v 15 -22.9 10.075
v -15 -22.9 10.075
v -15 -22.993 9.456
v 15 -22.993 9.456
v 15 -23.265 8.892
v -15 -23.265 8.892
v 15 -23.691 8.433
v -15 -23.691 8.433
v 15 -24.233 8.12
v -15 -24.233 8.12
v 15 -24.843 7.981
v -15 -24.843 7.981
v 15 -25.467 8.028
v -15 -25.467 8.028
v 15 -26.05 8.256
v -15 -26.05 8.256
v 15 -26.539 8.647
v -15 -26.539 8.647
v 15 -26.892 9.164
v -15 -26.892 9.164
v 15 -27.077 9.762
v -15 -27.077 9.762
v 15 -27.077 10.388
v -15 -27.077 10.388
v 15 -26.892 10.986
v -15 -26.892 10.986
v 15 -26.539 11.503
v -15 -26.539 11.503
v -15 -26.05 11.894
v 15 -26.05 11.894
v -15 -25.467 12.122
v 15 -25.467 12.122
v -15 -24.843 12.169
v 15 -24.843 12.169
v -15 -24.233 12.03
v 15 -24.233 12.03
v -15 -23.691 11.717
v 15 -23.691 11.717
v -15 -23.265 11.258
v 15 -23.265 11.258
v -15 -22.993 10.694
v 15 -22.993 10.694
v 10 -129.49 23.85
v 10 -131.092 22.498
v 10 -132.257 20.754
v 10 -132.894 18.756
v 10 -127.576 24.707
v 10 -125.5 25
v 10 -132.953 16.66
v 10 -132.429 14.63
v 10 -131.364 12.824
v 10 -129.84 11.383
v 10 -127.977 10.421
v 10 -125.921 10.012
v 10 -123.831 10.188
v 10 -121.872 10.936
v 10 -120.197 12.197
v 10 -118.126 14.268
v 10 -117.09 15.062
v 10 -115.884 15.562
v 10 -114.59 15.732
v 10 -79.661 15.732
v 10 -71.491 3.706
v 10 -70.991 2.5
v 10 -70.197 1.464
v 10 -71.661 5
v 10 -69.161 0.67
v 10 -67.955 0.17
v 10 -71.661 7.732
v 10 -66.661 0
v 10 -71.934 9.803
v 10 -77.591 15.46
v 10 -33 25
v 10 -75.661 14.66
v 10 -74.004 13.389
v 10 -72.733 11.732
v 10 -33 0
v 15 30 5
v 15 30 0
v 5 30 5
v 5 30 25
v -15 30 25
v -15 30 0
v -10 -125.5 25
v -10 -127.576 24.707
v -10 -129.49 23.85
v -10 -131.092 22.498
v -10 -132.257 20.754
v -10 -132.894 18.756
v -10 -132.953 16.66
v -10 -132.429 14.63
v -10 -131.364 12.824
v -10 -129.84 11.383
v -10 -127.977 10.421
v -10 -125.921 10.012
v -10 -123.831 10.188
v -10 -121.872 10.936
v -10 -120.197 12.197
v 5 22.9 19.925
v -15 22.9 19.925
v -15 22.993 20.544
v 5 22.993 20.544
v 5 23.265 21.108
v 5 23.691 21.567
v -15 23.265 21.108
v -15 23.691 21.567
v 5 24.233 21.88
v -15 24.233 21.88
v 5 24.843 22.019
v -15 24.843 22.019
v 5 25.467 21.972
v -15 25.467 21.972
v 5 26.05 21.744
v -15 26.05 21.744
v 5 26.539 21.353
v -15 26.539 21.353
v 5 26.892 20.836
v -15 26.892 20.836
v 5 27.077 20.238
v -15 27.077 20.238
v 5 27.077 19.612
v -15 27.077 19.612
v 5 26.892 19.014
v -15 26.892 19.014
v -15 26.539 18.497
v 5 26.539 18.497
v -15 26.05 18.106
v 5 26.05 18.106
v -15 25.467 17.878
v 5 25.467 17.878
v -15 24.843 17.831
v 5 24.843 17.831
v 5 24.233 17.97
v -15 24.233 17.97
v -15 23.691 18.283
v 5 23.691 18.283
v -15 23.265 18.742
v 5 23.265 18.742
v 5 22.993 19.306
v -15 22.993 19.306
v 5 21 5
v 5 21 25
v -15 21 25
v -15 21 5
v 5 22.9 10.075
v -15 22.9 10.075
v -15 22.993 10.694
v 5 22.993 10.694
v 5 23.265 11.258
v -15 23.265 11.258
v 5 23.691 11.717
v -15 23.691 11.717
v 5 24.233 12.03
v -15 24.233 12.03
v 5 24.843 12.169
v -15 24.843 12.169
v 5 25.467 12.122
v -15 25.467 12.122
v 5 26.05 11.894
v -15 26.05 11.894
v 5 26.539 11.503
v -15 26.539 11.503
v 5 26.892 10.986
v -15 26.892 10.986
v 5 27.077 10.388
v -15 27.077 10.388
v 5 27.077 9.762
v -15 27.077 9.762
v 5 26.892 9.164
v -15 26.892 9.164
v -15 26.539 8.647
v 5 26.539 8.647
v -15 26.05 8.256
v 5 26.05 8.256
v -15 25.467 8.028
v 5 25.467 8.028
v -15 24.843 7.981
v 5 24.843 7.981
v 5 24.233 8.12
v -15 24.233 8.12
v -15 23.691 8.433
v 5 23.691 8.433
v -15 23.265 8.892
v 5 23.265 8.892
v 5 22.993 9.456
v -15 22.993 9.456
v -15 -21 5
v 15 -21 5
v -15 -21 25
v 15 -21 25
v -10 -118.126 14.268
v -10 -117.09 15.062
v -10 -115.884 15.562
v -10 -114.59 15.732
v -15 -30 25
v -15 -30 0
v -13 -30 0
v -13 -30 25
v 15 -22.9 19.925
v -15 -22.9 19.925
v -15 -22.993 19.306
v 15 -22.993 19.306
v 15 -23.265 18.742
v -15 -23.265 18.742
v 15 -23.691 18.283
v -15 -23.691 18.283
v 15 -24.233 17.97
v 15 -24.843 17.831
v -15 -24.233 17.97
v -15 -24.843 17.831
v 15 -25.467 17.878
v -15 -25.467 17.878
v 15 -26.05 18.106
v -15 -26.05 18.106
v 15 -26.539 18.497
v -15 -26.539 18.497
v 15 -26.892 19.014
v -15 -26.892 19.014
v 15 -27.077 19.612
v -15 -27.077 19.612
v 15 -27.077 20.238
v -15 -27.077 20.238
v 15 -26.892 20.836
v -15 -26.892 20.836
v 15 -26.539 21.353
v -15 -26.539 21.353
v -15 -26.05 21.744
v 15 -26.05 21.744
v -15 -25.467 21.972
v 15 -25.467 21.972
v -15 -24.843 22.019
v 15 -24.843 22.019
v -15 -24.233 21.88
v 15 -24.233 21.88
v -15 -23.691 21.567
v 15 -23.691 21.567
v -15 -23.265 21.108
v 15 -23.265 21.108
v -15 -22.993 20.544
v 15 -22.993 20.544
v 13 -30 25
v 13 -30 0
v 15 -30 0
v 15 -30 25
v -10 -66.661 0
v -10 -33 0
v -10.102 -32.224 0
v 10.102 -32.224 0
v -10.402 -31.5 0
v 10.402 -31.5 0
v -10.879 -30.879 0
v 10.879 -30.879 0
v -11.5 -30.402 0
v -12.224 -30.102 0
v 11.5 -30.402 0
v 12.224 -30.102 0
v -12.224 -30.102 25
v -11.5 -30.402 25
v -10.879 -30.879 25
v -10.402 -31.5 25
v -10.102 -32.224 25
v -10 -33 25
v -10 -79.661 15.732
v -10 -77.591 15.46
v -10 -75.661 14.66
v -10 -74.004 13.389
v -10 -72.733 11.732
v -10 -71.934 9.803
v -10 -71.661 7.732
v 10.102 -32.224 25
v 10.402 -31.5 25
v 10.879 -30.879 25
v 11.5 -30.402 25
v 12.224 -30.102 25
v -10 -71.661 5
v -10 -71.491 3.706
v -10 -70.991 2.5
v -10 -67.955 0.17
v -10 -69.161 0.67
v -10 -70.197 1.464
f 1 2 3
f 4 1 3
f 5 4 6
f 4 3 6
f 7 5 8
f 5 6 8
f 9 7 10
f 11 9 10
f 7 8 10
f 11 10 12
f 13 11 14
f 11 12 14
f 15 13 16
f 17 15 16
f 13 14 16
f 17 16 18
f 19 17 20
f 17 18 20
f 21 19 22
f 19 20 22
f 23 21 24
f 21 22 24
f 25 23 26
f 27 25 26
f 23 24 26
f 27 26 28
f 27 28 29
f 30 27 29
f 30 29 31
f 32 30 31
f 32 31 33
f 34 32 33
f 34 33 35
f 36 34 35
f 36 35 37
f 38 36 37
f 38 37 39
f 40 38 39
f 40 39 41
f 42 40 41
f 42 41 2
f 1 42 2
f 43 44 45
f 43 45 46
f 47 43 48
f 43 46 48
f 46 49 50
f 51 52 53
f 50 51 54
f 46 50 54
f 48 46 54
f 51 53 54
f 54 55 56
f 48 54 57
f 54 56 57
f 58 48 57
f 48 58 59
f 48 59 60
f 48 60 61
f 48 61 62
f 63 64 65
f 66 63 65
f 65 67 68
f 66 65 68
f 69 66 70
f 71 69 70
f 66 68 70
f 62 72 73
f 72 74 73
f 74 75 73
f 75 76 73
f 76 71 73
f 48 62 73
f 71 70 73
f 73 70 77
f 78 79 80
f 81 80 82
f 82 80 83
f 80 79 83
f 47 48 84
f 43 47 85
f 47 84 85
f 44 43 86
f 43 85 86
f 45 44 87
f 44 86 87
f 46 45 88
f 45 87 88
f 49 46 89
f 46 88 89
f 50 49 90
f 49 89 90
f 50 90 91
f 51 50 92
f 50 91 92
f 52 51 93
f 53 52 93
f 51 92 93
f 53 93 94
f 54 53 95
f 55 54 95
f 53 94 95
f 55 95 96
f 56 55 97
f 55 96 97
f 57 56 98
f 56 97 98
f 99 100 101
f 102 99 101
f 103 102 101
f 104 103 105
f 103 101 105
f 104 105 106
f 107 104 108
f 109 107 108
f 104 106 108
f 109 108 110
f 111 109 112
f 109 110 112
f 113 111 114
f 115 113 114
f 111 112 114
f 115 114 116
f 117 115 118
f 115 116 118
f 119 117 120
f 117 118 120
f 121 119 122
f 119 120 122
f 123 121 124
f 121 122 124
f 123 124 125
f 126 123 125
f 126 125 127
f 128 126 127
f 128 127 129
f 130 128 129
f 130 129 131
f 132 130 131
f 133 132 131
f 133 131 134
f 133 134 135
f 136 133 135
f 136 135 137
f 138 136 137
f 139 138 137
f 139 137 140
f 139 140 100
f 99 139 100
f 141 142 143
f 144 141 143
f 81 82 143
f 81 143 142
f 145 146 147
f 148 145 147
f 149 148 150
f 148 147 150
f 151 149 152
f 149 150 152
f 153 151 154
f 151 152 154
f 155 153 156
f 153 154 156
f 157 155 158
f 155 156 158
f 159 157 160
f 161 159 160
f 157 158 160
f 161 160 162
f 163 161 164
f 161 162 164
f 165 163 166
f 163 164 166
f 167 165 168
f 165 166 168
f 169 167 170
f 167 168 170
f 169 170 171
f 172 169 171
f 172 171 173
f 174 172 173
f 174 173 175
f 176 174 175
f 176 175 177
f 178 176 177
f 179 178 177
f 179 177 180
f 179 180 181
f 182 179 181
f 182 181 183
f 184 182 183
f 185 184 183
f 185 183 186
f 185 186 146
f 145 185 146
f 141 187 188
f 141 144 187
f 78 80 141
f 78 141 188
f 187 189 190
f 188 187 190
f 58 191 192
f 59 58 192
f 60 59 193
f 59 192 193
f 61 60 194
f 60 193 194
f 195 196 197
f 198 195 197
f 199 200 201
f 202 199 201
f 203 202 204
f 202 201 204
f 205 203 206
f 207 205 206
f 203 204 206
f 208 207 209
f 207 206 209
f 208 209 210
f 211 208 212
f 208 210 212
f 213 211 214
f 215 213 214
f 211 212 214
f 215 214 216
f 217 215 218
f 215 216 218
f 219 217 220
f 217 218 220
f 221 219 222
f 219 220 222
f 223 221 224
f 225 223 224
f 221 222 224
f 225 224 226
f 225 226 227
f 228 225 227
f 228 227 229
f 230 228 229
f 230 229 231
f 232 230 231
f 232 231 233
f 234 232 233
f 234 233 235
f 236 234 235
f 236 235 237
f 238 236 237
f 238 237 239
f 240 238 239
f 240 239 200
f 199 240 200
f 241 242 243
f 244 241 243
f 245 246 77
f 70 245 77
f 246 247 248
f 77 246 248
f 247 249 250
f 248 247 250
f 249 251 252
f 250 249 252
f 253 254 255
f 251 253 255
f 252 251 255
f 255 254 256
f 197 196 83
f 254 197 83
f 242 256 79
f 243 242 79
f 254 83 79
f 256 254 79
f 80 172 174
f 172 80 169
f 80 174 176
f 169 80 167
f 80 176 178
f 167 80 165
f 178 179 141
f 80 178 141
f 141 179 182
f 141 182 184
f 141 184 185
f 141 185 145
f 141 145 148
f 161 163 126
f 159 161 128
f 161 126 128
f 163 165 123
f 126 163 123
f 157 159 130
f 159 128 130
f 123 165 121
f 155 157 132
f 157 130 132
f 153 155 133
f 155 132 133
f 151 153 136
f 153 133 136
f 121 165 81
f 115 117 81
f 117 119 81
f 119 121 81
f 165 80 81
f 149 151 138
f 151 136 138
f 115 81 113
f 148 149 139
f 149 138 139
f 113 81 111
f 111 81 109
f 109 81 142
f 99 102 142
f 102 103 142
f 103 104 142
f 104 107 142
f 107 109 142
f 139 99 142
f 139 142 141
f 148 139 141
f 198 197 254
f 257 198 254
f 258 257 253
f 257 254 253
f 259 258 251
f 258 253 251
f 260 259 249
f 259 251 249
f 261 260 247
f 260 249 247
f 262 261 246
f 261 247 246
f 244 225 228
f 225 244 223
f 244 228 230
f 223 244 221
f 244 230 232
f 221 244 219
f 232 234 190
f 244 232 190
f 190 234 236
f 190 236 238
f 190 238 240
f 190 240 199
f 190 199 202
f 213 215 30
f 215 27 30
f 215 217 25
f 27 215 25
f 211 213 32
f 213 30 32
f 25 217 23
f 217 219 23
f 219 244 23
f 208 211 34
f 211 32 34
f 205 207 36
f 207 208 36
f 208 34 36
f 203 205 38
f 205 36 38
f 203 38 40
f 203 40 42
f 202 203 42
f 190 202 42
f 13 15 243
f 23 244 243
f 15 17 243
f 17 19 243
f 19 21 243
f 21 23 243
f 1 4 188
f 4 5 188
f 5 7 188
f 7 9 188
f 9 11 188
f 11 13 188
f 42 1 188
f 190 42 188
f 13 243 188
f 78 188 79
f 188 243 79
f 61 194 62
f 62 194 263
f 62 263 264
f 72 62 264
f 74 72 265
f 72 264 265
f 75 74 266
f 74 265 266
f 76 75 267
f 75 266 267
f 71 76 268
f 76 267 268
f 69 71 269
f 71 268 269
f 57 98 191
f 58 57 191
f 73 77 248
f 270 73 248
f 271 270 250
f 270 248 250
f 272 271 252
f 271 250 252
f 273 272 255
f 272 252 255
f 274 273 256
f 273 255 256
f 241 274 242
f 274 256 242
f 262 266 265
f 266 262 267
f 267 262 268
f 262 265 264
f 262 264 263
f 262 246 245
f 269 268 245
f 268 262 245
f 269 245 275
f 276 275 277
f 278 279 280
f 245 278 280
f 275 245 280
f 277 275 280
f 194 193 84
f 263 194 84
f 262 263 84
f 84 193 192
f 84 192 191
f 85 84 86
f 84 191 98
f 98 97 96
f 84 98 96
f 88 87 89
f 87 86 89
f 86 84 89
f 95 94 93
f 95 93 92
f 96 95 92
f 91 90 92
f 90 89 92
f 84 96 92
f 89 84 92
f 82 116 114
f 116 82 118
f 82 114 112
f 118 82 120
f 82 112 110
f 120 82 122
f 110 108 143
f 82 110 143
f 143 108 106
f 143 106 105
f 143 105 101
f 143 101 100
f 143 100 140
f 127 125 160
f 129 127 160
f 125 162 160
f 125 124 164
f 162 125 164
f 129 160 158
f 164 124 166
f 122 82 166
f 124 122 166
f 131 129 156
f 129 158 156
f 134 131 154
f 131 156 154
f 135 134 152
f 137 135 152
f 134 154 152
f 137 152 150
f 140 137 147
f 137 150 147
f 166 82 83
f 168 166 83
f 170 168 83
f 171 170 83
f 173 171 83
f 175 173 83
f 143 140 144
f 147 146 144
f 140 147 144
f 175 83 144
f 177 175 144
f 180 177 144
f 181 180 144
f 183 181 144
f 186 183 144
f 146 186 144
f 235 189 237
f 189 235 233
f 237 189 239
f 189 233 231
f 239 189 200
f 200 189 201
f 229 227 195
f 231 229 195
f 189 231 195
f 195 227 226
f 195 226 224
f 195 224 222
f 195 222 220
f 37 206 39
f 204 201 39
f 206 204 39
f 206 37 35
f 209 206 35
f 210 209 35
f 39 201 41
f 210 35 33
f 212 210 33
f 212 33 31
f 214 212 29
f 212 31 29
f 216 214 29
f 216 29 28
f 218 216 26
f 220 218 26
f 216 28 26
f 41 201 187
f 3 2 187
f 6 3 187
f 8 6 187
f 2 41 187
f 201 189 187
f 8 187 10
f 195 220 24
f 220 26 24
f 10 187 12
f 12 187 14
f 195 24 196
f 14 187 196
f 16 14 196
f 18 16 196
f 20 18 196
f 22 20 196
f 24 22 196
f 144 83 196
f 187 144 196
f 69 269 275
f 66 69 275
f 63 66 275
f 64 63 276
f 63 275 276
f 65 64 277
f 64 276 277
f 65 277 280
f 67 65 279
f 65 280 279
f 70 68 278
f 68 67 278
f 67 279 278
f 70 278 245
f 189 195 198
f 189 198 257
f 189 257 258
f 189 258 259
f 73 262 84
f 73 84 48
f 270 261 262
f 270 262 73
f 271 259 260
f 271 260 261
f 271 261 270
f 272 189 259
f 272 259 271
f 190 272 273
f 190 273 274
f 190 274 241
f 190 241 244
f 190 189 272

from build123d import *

# Parameters (mm, degrees)
EXTRUDE_1_DEPTH     = 25
CUT_EXTRUDE_1_DEPTH = 20
SKETCH_3_R          = 2.1
CUT_EXTRUDE_2_DEPTH = 139.614573548
CUT_EXTRUDE_4_DEPTH = 138.61903938


with BuildPart() as part:
    # 草图1 → 凸台-拉伸1 (new body)
    with BuildSketch(Plane.XY):
        with BuildLine():
            Line((-15, -30), (-13, -30))
            ThreePointArc((-13, -30), (-10.878679656, -30.878679656), (-10, -33))
            Line((-10, -33), (-10, -133))
            Line((-10, -133), (0, -133))
            Line((0, -133), (10, -133))
            Line((10, -133), (10, -61))
            Line((10, -61), (10, -33))
            ThreePointArc((10, -33), (10.878679656, -30.878679656), (13, -30))
            Line((13, -30), (15, -30))
            Line((15, -30), (15, 30))
            Line((15, 30), (-15, 30))
            Line((-15, 30), (-15, -30))
        make_face()
    extrude(amount=EXTRUDE_1_DEPTH)

    # 草图2 → 切除-拉伸1 (cut)
    with BuildSketch(Plane.XY.offset(25)):
        Polygon((-15, -21), (15, -21), (15, 30), (5, 30), (5, 21), (-15, 21), align=None)
    extrude(amount=-CUT_EXTRUDE_1_DEPTH, mode=Mode.SUBTRACT)

    # 草图3 → 切除-拉伸2 (cut, through all)
    with BuildSketch(Plane.ZY.offset(15)):
        with Locations(Location((10.075, 25, 0), (0, 0, 270))):
            Circle(SKETCH_3_R)
        with Locations(Location((19.925, 25, 0), (0, 0, 270))):
            Circle(SKETCH_3_R)
        with Locations(Location((19.925, -25, 0), (0, 0, 90))):
            Circle(SKETCH_3_R)
        with Locations(Location((10.075, -25, 0), (0, 0, 90))):
            Circle(SKETCH_3_R)
    extrude(amount=-CUT_EXTRUDE_2_DEPTH, mode=Mode.SUBTRACT)

    # 草图5 → 切除-拉伸4 (cut, through all)
    with BuildSketch(Plane.ZY.offset(10)):
        with BuildLine():
            Line((12.196699141, -120.196699141), (14.267766953, -118.125631329))
            ThreePointArc((14.267766953, -118.125631329), (15.35163071, -116.503514585), (15.732233047, -114.590097423))
            Line((15.732233047, -114.590097423), (15.732233047, -79.661165235))
            ThreePointArc((15.732233047, -79.661165235), (13.389087297, -74.004310986), (7.732233047, -71.661165235))
            Line((7.732233047, -71.661165235), (5, -71.661165235))
            ThreePointArc((5, -71.661165235), (1.464466094, -70.196699141), (0, -66.661165235))
            Line((0, -66.661165235), (0, -143.423968406))
            Line((0, -143.423968406), (25, -142.592205506))
            Line((25, -142.592205506), (25, -125.5))
            ThreePointArc((25, -125.5), (14.629874257, -132.429096494), (12.196699141, -120.196699141))
        make_face()
    extrude(amount=-CUT_EXTRUDE_4_DEPTH, mode=Mode.SUBTRACT)


solid = part.part
